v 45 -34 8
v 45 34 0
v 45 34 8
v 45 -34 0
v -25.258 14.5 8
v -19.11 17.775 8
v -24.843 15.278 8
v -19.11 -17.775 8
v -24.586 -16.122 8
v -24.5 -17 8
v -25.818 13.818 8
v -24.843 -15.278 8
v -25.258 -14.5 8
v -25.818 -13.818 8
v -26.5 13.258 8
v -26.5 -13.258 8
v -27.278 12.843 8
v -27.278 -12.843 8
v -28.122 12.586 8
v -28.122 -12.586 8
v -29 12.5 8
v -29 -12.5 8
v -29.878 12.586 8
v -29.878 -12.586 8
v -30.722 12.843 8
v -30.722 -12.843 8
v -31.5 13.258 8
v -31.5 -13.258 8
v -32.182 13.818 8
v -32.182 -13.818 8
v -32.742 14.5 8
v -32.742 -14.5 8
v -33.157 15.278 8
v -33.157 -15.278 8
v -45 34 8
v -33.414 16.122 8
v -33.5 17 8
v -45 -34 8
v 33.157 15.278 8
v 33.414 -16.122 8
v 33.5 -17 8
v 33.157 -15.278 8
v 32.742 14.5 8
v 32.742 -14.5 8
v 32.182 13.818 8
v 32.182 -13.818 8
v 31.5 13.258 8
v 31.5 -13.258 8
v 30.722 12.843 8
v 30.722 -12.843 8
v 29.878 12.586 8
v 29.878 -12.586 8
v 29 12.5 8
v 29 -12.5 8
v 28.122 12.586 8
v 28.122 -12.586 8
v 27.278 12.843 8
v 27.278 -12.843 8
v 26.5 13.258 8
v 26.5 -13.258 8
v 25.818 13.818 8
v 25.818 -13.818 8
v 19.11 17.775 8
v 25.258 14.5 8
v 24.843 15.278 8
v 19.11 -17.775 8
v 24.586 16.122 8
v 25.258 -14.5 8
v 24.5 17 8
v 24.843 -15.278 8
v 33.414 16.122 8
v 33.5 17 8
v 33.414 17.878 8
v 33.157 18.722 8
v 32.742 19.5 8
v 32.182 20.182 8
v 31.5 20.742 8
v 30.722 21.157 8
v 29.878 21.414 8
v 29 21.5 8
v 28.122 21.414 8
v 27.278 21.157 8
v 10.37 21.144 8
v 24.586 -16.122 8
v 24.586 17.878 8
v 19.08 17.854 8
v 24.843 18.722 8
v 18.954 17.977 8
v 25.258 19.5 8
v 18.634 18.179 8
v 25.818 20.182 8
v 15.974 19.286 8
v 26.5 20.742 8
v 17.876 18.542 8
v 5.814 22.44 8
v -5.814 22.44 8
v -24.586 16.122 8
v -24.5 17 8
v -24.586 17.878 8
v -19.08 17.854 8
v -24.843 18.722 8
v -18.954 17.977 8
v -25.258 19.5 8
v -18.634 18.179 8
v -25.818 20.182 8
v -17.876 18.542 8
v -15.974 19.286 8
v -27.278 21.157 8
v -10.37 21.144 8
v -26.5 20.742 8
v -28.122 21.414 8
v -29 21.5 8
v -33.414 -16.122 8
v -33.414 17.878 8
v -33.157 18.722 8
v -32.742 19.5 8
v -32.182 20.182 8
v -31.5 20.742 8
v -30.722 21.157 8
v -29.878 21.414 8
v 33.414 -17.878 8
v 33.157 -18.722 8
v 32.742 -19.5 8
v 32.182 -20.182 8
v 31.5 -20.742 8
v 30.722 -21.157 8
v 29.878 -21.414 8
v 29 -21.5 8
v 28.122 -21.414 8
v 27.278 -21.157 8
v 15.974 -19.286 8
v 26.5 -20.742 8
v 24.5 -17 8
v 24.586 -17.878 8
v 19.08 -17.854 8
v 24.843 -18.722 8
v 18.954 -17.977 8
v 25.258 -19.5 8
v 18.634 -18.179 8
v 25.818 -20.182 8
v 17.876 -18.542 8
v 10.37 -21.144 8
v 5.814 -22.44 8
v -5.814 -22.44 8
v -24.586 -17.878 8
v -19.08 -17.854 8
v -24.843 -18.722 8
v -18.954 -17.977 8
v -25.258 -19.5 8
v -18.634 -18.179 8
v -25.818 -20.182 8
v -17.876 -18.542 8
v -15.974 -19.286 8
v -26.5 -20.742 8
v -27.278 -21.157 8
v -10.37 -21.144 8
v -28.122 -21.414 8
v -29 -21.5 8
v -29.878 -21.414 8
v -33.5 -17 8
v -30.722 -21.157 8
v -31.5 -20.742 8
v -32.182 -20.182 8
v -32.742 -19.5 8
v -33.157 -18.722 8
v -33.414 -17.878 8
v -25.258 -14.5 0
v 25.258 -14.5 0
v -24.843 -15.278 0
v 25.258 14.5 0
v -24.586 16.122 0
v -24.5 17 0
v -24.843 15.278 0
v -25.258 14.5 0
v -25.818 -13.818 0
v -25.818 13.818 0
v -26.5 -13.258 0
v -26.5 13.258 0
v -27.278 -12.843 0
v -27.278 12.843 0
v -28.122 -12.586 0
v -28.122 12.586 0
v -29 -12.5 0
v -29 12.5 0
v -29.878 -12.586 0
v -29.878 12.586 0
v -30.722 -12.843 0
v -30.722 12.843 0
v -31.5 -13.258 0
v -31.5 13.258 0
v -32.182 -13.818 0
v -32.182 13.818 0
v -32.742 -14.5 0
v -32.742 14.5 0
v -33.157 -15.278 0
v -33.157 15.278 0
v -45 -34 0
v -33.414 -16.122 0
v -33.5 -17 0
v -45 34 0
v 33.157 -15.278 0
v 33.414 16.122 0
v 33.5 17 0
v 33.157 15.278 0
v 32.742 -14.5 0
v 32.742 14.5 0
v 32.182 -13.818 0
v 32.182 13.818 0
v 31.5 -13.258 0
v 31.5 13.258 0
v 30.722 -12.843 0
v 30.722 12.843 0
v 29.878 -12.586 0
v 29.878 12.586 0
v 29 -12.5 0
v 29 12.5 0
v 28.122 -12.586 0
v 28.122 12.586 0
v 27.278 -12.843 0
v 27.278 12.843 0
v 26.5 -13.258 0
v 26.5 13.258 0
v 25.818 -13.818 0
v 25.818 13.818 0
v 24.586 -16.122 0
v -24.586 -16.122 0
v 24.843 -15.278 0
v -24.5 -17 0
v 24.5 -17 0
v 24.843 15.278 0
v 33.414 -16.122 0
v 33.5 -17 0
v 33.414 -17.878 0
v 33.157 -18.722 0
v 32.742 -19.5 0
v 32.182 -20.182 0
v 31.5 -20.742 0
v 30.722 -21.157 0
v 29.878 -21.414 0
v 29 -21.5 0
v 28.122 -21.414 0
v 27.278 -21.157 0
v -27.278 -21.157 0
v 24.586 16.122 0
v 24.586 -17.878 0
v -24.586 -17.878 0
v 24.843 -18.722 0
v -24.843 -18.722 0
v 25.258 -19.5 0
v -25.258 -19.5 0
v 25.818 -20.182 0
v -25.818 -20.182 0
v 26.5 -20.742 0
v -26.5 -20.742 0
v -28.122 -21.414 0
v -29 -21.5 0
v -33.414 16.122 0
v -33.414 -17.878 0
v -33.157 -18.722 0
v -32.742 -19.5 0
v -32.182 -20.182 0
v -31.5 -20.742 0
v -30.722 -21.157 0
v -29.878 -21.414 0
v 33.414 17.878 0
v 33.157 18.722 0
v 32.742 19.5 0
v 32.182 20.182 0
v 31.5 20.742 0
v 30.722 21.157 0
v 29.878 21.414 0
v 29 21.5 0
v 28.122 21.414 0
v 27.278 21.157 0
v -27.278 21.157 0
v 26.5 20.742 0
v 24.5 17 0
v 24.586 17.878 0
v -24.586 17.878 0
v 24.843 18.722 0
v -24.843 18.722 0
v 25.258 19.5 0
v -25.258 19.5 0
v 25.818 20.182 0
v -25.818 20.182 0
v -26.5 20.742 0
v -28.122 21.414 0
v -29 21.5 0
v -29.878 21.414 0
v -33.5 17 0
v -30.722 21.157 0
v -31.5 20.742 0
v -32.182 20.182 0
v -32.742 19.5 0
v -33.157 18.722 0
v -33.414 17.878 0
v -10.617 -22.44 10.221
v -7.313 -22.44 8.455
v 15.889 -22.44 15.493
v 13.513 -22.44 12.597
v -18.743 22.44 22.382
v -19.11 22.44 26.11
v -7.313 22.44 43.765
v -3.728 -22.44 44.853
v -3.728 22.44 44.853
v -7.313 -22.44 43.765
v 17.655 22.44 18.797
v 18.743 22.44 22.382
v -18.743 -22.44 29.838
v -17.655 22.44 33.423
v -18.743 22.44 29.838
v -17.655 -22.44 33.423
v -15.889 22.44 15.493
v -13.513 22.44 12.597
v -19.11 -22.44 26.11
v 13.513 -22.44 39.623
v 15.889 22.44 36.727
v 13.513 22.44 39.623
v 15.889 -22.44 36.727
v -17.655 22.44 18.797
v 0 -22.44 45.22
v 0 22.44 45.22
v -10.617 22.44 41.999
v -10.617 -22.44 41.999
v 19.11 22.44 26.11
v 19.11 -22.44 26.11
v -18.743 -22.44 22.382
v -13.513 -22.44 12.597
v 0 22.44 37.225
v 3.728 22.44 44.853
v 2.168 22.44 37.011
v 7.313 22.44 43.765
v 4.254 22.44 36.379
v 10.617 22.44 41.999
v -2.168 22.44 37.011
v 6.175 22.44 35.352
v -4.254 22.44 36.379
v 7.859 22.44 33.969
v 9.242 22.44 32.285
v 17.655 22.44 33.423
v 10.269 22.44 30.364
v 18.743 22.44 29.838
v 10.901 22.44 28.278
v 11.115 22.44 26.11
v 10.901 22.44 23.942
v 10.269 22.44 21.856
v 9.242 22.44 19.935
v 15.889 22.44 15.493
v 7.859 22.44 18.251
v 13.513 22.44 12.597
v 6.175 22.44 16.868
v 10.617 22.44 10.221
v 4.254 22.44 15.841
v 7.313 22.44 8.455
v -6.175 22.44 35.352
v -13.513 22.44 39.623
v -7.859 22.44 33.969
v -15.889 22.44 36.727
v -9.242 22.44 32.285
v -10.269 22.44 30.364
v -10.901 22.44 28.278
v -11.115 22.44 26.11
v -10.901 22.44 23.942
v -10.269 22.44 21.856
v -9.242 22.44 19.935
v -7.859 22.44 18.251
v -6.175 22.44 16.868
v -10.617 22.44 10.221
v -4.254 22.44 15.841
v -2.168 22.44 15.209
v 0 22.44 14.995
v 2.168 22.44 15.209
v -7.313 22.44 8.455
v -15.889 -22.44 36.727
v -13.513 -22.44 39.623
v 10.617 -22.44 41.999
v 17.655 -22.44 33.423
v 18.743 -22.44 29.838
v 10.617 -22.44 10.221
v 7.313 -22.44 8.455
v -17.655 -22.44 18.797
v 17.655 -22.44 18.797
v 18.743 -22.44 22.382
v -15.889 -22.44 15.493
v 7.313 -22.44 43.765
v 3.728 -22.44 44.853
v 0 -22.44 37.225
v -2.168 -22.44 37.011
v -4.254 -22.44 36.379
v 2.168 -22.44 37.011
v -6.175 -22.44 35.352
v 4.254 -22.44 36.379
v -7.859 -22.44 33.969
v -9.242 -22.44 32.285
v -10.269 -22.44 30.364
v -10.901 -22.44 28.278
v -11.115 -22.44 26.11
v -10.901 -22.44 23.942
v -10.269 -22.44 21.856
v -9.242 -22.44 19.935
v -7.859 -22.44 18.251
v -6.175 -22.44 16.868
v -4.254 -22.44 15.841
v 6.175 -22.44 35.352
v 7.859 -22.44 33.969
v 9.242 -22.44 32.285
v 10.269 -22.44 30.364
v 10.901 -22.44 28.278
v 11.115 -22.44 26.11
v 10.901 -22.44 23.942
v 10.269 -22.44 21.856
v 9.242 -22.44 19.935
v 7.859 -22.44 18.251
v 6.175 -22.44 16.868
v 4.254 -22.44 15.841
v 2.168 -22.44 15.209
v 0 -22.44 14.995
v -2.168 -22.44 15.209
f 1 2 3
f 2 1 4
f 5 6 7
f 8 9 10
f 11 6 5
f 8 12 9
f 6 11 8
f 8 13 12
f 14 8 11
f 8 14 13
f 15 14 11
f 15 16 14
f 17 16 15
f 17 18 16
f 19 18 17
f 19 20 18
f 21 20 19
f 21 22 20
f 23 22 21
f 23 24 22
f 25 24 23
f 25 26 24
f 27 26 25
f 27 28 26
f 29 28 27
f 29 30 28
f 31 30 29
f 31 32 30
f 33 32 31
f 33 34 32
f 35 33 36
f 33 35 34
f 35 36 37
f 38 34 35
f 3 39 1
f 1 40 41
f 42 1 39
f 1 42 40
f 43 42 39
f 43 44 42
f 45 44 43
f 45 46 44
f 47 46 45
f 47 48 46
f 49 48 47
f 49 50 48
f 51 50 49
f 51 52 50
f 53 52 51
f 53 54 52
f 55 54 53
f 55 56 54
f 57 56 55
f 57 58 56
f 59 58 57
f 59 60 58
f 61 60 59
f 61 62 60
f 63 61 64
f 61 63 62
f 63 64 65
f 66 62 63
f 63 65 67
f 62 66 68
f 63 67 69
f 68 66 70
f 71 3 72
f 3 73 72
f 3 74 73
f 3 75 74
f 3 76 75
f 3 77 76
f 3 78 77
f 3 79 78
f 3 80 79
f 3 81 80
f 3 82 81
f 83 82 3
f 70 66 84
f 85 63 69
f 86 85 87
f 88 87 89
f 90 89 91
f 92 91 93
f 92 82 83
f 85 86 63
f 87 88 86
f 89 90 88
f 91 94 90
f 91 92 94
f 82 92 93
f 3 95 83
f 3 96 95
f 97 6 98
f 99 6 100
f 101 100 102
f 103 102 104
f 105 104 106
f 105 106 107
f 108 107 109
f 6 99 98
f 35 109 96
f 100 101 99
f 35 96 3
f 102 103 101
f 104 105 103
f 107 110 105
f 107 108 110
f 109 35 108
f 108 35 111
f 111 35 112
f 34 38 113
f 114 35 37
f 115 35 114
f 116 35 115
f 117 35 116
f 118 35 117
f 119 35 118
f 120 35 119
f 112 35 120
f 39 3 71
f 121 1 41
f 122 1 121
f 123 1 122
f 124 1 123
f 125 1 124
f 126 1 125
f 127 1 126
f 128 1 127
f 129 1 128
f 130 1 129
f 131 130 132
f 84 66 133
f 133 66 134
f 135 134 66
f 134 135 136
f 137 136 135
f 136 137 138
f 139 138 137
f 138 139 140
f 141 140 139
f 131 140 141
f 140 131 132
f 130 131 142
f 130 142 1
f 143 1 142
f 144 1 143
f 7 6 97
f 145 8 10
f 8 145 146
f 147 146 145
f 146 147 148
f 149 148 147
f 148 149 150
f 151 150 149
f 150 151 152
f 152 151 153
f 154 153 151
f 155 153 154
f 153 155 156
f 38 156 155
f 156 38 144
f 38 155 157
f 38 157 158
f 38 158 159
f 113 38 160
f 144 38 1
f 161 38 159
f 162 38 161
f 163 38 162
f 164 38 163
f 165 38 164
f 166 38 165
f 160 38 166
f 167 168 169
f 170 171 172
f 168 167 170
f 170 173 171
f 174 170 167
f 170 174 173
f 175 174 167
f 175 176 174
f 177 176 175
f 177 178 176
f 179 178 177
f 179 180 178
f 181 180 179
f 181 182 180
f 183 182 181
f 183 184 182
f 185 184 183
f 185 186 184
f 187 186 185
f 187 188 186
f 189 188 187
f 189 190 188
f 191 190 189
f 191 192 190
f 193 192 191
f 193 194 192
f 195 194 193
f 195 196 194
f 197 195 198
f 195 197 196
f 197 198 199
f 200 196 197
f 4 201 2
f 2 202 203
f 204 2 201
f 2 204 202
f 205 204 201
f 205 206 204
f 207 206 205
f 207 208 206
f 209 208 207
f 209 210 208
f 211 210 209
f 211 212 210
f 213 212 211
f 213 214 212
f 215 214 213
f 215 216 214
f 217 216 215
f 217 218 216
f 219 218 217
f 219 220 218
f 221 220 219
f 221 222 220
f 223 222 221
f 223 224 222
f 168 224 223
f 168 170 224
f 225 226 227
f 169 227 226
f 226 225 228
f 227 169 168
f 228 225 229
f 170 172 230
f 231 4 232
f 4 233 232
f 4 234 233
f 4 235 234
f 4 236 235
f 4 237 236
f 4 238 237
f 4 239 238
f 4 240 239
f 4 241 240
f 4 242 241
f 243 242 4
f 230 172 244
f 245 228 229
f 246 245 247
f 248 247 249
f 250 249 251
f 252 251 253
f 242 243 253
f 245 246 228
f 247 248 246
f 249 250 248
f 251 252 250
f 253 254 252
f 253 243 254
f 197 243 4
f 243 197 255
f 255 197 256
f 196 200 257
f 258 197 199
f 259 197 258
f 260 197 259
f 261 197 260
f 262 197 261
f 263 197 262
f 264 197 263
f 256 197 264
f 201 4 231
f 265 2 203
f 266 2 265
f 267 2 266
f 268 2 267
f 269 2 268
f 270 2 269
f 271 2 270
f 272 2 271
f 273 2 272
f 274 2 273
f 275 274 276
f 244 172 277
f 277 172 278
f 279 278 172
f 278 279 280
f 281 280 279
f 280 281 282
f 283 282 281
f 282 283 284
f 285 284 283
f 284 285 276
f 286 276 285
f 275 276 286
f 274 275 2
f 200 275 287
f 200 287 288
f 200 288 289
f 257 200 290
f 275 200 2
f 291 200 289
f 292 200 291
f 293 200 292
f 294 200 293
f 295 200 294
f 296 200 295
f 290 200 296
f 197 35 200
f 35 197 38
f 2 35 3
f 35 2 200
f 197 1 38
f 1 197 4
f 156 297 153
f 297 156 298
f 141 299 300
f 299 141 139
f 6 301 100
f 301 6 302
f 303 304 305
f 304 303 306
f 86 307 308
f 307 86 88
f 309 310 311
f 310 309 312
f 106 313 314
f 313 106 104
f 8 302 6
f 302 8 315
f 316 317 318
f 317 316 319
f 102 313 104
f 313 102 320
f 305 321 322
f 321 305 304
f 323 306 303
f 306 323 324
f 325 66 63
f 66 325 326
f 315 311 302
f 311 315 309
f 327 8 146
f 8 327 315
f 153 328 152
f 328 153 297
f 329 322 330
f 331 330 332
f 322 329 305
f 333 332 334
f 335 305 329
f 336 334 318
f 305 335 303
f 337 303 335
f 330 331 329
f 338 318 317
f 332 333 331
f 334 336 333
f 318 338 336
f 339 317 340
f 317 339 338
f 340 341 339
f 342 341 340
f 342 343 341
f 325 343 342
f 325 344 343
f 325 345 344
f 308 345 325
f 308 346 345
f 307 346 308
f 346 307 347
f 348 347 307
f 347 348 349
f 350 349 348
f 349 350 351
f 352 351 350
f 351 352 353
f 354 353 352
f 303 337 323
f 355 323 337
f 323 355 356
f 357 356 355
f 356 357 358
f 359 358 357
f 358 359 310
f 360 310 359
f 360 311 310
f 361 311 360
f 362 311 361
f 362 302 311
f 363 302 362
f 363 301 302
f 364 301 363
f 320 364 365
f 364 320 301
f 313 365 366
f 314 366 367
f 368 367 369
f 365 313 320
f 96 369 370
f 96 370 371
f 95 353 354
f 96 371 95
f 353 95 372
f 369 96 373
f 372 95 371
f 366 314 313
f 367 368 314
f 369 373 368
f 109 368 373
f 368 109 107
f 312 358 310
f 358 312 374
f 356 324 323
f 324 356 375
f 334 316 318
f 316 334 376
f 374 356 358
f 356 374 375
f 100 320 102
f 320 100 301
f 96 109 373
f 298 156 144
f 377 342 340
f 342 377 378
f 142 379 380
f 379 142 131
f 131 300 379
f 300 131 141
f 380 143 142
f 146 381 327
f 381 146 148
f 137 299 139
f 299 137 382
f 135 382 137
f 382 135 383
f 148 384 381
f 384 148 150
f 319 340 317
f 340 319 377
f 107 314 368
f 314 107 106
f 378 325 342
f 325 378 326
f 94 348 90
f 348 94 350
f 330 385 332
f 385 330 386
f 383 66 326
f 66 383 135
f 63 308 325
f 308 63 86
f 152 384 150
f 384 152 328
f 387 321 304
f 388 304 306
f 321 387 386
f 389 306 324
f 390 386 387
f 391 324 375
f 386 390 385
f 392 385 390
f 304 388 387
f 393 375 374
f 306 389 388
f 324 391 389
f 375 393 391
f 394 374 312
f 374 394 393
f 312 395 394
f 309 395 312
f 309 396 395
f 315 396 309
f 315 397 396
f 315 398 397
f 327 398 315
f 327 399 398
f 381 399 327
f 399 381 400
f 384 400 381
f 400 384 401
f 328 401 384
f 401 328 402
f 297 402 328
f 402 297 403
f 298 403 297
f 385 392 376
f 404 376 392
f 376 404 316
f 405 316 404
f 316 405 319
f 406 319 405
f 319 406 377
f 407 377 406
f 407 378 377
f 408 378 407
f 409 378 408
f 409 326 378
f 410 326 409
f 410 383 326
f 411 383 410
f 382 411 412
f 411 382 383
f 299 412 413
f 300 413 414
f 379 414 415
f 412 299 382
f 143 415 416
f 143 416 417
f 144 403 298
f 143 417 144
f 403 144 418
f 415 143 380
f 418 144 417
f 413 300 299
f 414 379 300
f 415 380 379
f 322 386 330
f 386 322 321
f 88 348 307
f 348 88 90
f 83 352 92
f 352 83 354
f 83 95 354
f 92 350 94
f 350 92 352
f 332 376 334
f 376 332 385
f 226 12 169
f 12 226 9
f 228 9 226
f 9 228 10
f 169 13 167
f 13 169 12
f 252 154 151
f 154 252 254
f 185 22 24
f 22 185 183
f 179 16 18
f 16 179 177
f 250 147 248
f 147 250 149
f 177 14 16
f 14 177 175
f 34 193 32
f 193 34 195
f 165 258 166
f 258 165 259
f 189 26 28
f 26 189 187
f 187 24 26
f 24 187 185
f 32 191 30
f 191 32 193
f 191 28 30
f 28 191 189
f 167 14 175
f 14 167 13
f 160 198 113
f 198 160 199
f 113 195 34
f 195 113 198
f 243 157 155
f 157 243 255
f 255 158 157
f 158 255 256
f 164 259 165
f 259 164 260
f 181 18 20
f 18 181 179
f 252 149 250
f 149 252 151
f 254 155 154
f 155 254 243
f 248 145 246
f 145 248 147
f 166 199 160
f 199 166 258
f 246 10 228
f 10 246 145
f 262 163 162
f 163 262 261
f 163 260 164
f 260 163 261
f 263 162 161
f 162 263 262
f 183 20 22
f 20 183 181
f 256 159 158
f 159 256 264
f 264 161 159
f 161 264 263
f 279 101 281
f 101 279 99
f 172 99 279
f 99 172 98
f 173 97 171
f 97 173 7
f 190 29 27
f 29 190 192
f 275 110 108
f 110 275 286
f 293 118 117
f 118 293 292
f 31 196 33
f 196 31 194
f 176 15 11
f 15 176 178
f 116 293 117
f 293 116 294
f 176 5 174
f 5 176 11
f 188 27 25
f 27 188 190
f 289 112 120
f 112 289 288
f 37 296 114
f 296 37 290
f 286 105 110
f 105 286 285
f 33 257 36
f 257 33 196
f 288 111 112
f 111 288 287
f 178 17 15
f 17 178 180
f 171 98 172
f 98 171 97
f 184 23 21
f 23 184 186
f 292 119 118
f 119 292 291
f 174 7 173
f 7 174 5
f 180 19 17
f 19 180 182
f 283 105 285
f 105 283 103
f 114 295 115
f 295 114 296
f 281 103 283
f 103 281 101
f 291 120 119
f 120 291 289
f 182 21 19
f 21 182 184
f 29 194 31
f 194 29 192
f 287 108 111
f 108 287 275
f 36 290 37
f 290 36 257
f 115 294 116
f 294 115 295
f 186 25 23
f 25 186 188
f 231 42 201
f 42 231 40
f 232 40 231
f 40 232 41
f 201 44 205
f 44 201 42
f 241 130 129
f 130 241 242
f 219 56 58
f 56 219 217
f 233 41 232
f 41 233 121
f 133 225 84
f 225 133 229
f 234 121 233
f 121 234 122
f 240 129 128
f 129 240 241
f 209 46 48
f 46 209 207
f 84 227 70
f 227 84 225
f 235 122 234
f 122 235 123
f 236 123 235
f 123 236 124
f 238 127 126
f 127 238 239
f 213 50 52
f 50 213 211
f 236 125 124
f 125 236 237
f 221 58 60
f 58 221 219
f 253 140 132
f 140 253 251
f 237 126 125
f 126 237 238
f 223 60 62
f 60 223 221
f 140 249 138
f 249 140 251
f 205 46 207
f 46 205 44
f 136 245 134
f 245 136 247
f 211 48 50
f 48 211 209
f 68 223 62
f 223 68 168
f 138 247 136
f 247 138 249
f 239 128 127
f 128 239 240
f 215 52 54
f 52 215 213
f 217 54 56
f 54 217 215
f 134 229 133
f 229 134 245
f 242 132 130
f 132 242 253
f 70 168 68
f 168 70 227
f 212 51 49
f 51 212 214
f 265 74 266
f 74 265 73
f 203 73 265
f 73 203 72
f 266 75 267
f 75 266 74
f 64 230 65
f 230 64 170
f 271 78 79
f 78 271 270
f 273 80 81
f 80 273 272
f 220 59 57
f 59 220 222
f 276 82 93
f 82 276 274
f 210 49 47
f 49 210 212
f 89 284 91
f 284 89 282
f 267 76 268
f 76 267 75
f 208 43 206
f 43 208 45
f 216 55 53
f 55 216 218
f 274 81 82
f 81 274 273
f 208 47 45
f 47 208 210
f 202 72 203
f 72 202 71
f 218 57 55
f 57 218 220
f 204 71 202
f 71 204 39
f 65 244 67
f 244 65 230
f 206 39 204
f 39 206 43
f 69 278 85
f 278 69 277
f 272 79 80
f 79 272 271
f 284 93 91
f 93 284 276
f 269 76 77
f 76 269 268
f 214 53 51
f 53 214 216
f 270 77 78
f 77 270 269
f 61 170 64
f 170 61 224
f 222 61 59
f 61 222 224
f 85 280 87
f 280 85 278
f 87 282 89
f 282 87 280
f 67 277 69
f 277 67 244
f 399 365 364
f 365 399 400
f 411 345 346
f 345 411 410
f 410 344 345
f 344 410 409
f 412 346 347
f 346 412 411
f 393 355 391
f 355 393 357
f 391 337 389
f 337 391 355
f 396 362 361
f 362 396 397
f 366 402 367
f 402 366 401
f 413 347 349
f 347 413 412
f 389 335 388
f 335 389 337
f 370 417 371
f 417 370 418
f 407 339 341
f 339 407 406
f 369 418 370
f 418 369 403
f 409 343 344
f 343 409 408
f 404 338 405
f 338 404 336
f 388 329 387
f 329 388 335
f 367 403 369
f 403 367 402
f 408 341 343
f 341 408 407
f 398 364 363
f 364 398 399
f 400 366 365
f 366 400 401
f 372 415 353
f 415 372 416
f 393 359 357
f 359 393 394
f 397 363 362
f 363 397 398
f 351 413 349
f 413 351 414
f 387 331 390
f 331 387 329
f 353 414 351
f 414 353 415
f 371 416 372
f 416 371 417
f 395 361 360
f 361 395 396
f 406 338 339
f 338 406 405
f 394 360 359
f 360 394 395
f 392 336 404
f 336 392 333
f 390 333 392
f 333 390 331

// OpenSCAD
$fn = 32;

// ----------------------------------------------------------------------
// Bearing block: 90 x 68 mm base, 22.23 mm bore at 26.11 mm
// ----------------------------------------------------------------------

// --- parameters (mm) ---
base_w = 90;              // base width
base_d = 68;              // base depth
base_t = 8;               // base thickness
bore_d = 22.23;           // shaft / bearing bore
house_r = 19.11;          // housing outer radius
house_len = 44.88;        // housing length along the shaft
foot_w = 38.22;           // foot width under the housing
foot_len = 34.88;         // foot length along the shaft
axis_z = 26.11;           // bore axis height above the base
holes_d = 9;              // mounting holes
hole_x = 29;              // mounting hole spacing

difference() {
  union() {
    /* base plate with its underside on z = 0 */
    translate([0, 0, base_t / 2]) cube([base_w, base_d, base_t], center = true);
    /* hull foot: a straight web blending into the round housing */
    hull() {
      translate([0, 0, base_t - 0.5]) cube([foot_w, foot_len, 1.6], center = true);
      translate([0, 0, axis_z]) rotate([-90, 0, 0]) cylinder(h = house_len, d = 2 * house_r, center = true);
    }
  }
  /* bore through the housing, 2.5 mm clear on both sides */
  translate([0, 0, axis_z]) rotate([-90, 0, 0]) cylinder(h = house_len + 5, d = bore_d, center = true);
  /* mounting holes through the base plate */
  for (hx = [-29, 29]) {
    for (hy = [-17, 17]) {
      translate([hx, hy, -2.5]) cylinder(h = base_t + 5, d = holes_d);
    }
  }
}
